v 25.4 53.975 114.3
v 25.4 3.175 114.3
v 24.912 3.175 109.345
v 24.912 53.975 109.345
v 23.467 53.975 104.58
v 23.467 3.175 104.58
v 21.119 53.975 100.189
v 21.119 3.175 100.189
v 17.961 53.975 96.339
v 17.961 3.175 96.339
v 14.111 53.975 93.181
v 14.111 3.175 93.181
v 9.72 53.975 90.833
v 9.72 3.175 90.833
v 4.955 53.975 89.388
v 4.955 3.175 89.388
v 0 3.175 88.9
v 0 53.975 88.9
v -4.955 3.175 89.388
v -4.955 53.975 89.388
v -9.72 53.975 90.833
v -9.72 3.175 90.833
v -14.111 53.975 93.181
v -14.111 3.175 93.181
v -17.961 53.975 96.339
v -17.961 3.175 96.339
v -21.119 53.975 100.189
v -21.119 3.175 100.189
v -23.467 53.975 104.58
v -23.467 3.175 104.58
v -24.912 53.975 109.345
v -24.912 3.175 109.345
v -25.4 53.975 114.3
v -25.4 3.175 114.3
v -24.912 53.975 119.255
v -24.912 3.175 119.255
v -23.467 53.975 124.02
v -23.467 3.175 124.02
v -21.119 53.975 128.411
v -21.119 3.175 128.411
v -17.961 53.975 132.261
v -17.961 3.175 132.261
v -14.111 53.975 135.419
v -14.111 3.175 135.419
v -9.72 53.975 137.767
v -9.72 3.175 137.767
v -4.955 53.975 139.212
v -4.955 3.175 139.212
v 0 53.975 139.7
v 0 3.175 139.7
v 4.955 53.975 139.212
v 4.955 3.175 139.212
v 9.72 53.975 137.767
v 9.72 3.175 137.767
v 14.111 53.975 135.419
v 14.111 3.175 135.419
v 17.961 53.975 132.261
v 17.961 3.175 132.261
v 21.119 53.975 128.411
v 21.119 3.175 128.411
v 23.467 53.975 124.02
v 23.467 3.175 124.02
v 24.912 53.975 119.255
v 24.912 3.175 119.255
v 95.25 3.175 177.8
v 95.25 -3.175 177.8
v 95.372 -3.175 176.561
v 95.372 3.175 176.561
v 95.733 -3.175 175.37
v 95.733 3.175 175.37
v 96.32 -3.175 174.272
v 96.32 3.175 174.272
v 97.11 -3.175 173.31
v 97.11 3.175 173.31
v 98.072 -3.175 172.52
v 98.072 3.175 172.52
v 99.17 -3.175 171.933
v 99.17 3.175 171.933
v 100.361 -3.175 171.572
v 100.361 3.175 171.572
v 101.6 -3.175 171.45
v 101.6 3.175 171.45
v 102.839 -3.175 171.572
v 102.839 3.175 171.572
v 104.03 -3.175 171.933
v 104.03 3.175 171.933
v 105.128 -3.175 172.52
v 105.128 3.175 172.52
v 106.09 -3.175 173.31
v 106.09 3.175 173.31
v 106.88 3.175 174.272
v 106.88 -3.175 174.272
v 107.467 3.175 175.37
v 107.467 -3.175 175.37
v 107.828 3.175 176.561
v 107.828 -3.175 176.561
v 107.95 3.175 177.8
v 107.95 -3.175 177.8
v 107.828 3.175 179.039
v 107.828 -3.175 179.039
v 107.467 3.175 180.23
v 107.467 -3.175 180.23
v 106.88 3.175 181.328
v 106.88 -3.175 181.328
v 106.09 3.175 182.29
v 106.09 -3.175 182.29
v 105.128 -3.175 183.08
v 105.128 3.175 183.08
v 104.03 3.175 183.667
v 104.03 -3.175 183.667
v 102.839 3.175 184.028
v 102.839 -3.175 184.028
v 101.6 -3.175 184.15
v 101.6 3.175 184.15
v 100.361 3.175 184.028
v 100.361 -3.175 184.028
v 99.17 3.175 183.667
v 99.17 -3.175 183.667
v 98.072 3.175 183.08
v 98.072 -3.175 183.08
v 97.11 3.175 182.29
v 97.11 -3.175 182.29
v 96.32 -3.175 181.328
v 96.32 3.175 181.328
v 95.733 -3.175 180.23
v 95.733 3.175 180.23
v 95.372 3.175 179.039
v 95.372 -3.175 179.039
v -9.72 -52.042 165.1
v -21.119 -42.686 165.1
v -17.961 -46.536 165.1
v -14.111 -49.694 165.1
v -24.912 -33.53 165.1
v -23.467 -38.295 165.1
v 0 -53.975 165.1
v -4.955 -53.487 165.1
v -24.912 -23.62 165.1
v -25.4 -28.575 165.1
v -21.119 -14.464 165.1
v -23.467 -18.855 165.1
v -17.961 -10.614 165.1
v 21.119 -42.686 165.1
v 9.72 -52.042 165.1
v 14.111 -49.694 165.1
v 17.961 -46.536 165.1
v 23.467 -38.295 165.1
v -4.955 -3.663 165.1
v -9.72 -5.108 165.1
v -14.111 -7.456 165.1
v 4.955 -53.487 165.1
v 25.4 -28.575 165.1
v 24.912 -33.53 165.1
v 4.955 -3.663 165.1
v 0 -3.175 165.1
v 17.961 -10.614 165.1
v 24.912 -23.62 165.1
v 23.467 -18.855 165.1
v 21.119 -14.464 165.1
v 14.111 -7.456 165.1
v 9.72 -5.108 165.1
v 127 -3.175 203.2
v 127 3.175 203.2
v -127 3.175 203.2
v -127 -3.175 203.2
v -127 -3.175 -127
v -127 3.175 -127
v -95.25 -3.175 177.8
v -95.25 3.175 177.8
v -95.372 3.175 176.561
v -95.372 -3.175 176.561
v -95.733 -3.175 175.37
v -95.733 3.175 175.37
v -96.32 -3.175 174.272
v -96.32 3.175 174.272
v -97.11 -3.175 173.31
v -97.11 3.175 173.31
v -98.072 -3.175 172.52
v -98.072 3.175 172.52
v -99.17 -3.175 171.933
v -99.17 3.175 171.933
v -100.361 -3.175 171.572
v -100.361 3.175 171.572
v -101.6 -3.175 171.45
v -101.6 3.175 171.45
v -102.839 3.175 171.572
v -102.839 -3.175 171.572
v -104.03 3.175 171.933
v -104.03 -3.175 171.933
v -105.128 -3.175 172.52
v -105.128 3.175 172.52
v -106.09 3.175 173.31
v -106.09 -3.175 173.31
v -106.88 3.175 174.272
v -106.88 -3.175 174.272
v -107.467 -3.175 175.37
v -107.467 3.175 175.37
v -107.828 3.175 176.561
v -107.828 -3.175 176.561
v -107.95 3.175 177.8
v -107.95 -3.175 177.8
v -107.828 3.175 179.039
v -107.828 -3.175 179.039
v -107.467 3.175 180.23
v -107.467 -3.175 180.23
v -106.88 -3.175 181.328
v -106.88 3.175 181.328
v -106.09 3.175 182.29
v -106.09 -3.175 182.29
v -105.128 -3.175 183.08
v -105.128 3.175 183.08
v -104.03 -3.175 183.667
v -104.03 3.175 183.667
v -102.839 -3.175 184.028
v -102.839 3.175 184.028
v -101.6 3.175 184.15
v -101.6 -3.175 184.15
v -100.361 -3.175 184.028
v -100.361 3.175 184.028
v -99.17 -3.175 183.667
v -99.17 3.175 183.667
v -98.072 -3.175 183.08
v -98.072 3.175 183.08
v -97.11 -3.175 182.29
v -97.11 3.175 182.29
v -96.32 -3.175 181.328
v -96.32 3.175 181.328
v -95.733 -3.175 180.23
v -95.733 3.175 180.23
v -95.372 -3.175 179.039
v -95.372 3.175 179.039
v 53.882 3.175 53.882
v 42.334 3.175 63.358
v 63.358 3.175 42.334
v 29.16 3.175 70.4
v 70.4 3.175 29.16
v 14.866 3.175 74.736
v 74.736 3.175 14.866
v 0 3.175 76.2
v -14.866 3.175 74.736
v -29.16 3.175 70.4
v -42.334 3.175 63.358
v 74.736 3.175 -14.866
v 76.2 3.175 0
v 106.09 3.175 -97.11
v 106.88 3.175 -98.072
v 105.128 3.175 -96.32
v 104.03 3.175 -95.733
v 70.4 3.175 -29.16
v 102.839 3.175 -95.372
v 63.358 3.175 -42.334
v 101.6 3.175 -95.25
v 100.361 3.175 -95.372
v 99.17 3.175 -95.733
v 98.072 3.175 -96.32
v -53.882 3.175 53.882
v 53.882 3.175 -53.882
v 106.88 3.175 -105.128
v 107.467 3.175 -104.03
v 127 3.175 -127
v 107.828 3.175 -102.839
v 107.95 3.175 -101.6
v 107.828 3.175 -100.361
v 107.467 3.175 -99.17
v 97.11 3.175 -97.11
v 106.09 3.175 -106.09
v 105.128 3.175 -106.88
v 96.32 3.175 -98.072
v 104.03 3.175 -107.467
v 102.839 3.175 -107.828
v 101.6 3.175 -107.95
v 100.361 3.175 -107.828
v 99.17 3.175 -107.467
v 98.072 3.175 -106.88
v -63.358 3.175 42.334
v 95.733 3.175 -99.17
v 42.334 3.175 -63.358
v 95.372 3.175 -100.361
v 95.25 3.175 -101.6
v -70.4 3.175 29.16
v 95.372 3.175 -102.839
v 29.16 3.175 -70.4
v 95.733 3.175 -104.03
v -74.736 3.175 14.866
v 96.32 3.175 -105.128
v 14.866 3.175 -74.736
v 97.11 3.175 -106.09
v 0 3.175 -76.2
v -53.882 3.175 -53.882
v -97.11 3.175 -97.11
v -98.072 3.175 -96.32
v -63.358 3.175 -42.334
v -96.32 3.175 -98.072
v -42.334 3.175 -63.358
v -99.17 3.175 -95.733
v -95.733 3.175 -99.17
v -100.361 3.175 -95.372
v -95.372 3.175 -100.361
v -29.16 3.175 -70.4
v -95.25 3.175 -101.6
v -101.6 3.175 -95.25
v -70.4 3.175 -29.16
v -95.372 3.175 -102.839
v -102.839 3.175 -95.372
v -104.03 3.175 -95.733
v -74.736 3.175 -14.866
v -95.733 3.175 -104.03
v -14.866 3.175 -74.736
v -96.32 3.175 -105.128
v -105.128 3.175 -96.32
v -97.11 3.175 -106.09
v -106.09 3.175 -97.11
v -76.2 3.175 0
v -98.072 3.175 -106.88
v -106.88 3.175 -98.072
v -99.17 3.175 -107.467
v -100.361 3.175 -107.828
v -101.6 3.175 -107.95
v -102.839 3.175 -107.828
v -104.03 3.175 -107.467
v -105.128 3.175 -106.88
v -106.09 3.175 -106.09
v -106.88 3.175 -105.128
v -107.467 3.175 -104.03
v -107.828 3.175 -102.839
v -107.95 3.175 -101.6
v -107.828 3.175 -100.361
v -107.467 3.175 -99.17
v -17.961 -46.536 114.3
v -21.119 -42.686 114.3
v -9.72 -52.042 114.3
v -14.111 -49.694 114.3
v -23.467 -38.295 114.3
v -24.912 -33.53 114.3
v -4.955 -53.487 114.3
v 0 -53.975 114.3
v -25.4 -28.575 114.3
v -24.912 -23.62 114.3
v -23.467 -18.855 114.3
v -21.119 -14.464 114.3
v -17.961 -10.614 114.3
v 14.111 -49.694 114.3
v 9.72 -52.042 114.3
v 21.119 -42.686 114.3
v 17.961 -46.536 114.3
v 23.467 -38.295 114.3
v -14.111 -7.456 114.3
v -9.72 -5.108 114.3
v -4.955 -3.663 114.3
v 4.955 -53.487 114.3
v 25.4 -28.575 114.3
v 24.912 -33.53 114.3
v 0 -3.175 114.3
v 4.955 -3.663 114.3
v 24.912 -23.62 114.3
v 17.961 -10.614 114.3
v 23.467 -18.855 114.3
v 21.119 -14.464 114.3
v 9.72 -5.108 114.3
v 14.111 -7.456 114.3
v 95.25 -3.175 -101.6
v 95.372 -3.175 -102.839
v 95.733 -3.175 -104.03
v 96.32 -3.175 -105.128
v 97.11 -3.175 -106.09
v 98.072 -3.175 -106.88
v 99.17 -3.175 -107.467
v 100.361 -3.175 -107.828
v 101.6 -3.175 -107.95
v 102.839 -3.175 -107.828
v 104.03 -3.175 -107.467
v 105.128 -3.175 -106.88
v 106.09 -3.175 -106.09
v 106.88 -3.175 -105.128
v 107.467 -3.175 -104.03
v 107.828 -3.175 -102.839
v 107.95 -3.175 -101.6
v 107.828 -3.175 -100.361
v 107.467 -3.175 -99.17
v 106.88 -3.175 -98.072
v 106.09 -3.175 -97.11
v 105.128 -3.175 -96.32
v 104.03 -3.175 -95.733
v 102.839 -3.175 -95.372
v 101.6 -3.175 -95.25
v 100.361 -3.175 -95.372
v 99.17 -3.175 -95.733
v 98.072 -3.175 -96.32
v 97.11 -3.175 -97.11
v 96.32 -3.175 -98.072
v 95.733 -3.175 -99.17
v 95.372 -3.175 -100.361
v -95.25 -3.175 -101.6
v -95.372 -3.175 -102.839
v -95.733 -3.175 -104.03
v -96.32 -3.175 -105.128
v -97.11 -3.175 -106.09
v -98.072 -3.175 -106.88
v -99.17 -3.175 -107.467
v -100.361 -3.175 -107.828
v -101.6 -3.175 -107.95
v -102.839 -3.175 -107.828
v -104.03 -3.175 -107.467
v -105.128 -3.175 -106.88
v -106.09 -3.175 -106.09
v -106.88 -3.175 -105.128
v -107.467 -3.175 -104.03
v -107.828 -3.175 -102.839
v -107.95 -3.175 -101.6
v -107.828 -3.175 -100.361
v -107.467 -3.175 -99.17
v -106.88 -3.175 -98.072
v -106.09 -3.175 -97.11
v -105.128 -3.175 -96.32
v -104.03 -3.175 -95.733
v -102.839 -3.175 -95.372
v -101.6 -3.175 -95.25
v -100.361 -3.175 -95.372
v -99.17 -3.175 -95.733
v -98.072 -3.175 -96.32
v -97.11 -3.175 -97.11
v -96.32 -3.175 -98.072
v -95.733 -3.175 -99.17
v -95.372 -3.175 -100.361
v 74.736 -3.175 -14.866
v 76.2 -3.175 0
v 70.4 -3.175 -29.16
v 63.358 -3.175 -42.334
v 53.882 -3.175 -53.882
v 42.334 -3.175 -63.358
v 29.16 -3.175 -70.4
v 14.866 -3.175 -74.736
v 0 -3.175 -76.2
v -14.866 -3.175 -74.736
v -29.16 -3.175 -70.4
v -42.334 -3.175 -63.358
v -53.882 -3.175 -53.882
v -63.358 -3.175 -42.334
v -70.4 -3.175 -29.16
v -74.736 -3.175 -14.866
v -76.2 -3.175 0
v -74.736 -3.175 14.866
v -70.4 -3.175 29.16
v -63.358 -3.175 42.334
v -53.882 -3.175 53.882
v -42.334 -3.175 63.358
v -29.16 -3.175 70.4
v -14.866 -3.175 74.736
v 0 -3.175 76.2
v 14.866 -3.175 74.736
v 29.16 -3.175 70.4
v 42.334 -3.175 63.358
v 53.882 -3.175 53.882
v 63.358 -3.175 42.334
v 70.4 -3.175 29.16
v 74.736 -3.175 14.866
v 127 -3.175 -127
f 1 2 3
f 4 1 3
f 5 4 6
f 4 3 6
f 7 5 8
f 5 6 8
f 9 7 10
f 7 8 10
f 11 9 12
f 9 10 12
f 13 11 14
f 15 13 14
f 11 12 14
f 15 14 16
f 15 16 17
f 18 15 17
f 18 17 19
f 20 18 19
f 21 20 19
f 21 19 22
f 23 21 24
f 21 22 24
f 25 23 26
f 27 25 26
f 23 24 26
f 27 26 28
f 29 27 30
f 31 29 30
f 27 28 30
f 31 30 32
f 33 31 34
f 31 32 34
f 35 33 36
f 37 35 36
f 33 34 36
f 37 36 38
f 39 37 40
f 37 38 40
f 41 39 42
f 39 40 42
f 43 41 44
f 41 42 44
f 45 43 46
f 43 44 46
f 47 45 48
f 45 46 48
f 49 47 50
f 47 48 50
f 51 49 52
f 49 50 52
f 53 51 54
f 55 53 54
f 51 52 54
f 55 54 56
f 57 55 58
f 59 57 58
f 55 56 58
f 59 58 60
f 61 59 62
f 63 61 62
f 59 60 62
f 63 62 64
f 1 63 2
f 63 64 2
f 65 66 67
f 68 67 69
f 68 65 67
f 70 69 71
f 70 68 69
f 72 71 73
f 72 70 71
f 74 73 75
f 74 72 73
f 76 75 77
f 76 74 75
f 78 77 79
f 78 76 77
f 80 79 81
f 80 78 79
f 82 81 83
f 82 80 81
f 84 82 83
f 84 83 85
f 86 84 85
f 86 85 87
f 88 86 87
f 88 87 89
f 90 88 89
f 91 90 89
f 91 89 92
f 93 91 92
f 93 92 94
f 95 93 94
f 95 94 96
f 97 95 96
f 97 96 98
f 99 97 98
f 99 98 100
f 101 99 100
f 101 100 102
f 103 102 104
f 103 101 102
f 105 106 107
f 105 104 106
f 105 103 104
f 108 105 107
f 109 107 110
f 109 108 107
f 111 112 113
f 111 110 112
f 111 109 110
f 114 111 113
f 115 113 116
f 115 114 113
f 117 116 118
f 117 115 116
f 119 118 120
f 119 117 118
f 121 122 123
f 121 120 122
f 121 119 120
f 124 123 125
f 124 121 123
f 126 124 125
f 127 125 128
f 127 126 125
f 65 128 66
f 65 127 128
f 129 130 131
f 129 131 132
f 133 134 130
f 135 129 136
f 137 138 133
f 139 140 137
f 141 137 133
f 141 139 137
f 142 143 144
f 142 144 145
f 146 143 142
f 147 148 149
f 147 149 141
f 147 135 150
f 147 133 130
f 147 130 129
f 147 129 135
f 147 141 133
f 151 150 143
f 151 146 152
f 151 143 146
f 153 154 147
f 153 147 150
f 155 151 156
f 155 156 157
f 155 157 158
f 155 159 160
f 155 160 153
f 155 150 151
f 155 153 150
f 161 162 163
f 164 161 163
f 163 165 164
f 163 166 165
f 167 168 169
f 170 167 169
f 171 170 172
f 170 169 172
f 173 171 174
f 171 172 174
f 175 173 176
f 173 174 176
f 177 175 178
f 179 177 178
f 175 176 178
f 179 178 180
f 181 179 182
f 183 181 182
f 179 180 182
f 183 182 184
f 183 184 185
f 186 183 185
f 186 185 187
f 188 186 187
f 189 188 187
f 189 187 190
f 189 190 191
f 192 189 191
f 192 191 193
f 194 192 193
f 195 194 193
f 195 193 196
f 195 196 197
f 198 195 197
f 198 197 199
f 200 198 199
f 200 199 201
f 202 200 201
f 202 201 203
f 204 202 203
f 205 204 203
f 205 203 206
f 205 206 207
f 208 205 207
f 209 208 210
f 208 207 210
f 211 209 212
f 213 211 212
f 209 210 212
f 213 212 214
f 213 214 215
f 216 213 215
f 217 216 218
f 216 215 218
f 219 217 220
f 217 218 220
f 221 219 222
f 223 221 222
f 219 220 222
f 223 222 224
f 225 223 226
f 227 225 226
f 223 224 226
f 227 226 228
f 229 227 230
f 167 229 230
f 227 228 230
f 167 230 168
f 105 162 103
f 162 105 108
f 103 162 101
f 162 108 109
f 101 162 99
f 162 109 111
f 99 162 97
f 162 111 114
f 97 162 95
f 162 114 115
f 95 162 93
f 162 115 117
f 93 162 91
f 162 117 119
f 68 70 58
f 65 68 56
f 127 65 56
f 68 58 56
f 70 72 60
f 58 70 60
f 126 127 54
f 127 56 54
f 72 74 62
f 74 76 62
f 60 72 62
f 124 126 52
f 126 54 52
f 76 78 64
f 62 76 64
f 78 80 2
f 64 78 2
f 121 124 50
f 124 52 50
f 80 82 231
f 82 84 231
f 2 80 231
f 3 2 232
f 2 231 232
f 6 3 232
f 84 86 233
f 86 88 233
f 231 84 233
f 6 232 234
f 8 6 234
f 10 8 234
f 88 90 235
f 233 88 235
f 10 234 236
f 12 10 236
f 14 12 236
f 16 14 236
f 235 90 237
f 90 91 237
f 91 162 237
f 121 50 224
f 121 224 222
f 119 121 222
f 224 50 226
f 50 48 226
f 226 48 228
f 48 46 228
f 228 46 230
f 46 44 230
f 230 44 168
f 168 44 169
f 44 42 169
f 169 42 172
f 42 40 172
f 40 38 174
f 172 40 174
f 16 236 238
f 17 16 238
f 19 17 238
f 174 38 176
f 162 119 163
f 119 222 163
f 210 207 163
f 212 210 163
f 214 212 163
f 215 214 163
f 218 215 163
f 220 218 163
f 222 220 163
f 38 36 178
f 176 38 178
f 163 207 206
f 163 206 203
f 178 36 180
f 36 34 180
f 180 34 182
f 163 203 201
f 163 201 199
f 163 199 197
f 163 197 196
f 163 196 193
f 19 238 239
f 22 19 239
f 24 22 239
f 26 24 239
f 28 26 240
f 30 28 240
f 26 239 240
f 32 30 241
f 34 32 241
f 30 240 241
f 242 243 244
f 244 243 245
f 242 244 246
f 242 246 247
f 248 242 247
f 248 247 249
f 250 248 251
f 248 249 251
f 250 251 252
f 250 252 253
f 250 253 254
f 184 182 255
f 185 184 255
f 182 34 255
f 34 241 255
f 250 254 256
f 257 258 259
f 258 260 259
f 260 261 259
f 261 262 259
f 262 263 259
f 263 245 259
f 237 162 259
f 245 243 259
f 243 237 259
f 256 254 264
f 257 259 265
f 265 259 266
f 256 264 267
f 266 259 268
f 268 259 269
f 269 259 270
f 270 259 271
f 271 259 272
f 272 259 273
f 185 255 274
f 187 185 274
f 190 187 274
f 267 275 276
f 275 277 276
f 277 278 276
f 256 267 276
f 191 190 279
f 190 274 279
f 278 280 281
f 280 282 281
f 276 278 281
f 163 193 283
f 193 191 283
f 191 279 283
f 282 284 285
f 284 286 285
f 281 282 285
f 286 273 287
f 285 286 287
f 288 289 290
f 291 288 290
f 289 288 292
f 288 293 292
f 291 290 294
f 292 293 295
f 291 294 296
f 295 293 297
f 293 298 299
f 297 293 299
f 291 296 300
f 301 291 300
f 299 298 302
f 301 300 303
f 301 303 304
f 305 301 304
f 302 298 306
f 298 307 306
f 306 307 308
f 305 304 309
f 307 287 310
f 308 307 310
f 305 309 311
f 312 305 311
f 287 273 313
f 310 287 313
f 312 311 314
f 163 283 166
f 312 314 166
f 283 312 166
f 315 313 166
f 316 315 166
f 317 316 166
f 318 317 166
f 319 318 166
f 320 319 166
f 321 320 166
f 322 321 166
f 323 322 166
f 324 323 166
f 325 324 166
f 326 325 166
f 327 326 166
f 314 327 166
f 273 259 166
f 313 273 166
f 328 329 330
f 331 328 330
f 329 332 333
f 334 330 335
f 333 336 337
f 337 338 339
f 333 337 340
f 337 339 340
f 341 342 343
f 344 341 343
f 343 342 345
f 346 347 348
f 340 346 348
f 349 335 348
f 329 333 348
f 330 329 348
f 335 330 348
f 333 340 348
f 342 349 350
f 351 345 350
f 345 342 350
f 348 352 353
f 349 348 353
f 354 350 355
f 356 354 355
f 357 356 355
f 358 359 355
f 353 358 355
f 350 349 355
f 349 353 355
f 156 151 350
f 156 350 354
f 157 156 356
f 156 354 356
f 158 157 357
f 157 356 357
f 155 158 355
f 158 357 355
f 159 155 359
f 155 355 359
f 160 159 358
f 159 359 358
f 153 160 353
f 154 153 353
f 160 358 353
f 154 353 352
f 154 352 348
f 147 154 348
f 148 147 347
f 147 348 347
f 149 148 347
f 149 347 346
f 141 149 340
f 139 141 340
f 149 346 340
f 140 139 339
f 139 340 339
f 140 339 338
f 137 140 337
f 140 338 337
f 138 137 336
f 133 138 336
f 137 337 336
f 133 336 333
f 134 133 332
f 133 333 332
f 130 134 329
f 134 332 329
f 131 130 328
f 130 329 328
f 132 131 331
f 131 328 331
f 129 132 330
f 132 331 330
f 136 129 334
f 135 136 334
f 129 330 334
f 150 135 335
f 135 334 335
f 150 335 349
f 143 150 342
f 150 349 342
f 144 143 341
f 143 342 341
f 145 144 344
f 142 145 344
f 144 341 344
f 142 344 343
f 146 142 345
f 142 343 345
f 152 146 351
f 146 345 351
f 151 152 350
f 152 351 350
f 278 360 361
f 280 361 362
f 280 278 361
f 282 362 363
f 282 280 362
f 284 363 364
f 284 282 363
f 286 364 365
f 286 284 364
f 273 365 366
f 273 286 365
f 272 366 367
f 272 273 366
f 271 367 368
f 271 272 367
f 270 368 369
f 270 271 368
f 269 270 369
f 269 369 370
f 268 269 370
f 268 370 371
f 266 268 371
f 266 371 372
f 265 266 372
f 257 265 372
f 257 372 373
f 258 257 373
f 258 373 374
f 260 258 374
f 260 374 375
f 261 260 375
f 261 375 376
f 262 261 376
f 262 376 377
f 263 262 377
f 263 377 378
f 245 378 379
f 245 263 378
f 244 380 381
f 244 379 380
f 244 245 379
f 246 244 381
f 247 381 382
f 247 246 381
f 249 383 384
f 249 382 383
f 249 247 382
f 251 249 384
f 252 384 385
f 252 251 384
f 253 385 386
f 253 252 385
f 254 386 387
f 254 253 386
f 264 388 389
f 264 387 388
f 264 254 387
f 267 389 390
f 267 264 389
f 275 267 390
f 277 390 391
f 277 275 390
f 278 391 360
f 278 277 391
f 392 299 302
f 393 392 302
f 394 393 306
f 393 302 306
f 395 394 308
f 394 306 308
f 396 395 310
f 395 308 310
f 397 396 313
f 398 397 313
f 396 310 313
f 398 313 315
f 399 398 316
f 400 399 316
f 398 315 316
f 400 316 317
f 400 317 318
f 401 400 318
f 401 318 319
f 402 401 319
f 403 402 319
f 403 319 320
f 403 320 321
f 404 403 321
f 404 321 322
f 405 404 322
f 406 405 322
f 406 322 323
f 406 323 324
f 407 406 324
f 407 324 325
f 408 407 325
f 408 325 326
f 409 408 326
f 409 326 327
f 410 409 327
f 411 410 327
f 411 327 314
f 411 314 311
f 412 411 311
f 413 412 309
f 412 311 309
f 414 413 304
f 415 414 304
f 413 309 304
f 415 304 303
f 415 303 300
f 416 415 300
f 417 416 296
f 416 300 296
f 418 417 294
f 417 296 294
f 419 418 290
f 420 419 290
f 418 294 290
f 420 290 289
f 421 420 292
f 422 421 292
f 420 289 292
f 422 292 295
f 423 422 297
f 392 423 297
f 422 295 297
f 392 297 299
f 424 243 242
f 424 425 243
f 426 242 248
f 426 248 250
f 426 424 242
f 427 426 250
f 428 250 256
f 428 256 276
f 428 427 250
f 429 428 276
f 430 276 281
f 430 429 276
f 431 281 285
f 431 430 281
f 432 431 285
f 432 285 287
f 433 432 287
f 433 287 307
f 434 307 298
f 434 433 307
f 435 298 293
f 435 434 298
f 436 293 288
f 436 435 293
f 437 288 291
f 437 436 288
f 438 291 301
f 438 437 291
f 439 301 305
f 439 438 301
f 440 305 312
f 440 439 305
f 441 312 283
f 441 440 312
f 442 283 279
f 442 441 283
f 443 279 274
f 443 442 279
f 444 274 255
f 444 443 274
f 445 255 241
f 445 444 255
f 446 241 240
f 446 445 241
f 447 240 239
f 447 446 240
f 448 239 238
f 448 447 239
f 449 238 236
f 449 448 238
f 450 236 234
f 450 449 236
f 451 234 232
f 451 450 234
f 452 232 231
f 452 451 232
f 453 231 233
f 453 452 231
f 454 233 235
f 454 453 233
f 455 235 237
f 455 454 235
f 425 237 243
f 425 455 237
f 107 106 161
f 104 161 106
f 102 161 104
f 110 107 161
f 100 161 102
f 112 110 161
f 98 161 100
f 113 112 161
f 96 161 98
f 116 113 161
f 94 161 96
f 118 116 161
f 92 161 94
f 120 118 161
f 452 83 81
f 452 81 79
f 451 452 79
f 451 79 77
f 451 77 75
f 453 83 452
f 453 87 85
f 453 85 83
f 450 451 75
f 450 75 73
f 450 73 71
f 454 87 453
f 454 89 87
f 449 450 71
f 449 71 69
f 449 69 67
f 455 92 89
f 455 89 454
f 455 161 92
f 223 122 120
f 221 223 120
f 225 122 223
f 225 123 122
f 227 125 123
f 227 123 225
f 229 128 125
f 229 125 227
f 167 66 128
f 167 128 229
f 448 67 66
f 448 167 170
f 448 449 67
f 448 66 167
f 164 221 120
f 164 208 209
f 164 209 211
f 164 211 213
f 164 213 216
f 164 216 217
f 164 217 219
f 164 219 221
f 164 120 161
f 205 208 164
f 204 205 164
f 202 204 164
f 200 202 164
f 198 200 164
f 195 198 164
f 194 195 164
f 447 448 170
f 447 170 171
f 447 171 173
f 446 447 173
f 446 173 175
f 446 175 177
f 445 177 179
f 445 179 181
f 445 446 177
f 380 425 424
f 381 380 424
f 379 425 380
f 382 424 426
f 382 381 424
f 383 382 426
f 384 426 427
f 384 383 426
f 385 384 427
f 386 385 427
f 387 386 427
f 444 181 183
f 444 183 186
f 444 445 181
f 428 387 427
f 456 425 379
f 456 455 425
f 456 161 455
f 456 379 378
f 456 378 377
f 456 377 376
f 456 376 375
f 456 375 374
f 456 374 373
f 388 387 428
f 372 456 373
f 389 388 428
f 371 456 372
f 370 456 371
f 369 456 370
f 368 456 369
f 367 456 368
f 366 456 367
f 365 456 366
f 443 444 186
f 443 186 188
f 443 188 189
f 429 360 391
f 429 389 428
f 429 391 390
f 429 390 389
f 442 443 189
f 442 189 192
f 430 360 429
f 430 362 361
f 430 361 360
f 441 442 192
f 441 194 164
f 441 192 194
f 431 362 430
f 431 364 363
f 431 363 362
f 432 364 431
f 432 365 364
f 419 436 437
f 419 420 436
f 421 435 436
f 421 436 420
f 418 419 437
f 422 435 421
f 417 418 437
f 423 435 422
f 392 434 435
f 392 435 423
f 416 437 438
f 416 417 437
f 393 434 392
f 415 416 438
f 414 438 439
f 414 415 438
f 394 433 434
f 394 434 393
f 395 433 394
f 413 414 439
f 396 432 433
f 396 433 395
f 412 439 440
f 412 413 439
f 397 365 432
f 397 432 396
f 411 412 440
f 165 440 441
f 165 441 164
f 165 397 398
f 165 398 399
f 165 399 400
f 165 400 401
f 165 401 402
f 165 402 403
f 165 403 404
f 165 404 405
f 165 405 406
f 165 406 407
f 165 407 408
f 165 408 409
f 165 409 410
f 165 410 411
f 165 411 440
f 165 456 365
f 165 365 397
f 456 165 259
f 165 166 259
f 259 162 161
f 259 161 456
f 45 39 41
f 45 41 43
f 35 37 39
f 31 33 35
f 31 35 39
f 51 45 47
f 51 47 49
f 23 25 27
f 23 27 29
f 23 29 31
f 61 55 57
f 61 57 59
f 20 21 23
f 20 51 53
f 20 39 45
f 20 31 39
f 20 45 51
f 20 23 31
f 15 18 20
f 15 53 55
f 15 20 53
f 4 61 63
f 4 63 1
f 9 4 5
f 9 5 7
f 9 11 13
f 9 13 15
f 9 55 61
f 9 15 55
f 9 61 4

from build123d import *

# Parameters (mm, degrees)
SKETCH1_R           = 76.2
BOSS_EXTRUDE1_DEPTH = 3.175
SKETCH2_R           = 25.4
BOSS_EXTRUDE2_DEPTH = 50.8
SKETCH3_R           = 6.35
CUT_EXTRUDE1_DEPTH  = 7.35
BOSS_EXTRUDE3_START = 114.3
SKETCH4_R           = 25.4
BOSS_EXTRUDE3_DEPTH = 50.8


with BuildPart() as part:
    # Sketch1 → Boss-Extrude1 (new body, symmetric)
    with BuildSketch(Plane(origin=(0, 0, 0), x_dir=(1, 0, 0), z_dir=(0, 1, 0))):
        Polygon((-127, -127), (-127, 127), (127, 127), (127, -127), (127, -203.2), (-127, -203.2), align=None)
        Circle(SKETCH1_R, mode=Mode.SUBTRACT)
    extrude(amount=BOSS_EXTRUDE1_DEPTH, both=True)

    # Sketch2 → Boss-Extrude2 (add)
    with BuildSketch(Plane(origin=(0, 3.175, 0), x_dir=(1, 0, 0), z_dir=(0, 1, 0))):
        with Locations((0, -114.3)):
            Circle(SKETCH2_R)
    extrude(amount=BOSS_EXTRUDE2_DEPTH)

    # Sketch3 → Cut-Extrude1 (cut, through all)
    with BuildSketch(Plane(origin=(0, 3.175, 0), x_dir=(1, 0, 0), z_dir=(0, 1, 0))):
        with Locations((-101.6, 101.6)):
            Circle(SKETCH3_R)
        with Locations((-101.6, -177.8)):
            Circle(SKETCH3_R)
    cut_extrude1 = extrude(amount=-CUT_EXTRUDE1_DEPTH, mode=Mode.SUBTRACT)

    # Mirror1: Cut-Extrude1 across plane
    add(cut_extrude1.mirror(Plane(origin=(0, 0, 0), x_dir=(0, 0, 1), z_dir=(1, 0, 0))), mode=Mode.SUBTRACT)


with BuildPart() as body_2:
    # Sketch4 → Boss-Extrude3 (new body)
    with BuildSketch(Plane.XY.offset(BOSS_EXTRUDE3_START)):
        with Locations((0, -28.575)):
            Circle(SKETCH4_R)
    extrude(amount=BOSS_EXTRUDE3_DEPTH)


solid = Compound([part.part, body_2.part])
